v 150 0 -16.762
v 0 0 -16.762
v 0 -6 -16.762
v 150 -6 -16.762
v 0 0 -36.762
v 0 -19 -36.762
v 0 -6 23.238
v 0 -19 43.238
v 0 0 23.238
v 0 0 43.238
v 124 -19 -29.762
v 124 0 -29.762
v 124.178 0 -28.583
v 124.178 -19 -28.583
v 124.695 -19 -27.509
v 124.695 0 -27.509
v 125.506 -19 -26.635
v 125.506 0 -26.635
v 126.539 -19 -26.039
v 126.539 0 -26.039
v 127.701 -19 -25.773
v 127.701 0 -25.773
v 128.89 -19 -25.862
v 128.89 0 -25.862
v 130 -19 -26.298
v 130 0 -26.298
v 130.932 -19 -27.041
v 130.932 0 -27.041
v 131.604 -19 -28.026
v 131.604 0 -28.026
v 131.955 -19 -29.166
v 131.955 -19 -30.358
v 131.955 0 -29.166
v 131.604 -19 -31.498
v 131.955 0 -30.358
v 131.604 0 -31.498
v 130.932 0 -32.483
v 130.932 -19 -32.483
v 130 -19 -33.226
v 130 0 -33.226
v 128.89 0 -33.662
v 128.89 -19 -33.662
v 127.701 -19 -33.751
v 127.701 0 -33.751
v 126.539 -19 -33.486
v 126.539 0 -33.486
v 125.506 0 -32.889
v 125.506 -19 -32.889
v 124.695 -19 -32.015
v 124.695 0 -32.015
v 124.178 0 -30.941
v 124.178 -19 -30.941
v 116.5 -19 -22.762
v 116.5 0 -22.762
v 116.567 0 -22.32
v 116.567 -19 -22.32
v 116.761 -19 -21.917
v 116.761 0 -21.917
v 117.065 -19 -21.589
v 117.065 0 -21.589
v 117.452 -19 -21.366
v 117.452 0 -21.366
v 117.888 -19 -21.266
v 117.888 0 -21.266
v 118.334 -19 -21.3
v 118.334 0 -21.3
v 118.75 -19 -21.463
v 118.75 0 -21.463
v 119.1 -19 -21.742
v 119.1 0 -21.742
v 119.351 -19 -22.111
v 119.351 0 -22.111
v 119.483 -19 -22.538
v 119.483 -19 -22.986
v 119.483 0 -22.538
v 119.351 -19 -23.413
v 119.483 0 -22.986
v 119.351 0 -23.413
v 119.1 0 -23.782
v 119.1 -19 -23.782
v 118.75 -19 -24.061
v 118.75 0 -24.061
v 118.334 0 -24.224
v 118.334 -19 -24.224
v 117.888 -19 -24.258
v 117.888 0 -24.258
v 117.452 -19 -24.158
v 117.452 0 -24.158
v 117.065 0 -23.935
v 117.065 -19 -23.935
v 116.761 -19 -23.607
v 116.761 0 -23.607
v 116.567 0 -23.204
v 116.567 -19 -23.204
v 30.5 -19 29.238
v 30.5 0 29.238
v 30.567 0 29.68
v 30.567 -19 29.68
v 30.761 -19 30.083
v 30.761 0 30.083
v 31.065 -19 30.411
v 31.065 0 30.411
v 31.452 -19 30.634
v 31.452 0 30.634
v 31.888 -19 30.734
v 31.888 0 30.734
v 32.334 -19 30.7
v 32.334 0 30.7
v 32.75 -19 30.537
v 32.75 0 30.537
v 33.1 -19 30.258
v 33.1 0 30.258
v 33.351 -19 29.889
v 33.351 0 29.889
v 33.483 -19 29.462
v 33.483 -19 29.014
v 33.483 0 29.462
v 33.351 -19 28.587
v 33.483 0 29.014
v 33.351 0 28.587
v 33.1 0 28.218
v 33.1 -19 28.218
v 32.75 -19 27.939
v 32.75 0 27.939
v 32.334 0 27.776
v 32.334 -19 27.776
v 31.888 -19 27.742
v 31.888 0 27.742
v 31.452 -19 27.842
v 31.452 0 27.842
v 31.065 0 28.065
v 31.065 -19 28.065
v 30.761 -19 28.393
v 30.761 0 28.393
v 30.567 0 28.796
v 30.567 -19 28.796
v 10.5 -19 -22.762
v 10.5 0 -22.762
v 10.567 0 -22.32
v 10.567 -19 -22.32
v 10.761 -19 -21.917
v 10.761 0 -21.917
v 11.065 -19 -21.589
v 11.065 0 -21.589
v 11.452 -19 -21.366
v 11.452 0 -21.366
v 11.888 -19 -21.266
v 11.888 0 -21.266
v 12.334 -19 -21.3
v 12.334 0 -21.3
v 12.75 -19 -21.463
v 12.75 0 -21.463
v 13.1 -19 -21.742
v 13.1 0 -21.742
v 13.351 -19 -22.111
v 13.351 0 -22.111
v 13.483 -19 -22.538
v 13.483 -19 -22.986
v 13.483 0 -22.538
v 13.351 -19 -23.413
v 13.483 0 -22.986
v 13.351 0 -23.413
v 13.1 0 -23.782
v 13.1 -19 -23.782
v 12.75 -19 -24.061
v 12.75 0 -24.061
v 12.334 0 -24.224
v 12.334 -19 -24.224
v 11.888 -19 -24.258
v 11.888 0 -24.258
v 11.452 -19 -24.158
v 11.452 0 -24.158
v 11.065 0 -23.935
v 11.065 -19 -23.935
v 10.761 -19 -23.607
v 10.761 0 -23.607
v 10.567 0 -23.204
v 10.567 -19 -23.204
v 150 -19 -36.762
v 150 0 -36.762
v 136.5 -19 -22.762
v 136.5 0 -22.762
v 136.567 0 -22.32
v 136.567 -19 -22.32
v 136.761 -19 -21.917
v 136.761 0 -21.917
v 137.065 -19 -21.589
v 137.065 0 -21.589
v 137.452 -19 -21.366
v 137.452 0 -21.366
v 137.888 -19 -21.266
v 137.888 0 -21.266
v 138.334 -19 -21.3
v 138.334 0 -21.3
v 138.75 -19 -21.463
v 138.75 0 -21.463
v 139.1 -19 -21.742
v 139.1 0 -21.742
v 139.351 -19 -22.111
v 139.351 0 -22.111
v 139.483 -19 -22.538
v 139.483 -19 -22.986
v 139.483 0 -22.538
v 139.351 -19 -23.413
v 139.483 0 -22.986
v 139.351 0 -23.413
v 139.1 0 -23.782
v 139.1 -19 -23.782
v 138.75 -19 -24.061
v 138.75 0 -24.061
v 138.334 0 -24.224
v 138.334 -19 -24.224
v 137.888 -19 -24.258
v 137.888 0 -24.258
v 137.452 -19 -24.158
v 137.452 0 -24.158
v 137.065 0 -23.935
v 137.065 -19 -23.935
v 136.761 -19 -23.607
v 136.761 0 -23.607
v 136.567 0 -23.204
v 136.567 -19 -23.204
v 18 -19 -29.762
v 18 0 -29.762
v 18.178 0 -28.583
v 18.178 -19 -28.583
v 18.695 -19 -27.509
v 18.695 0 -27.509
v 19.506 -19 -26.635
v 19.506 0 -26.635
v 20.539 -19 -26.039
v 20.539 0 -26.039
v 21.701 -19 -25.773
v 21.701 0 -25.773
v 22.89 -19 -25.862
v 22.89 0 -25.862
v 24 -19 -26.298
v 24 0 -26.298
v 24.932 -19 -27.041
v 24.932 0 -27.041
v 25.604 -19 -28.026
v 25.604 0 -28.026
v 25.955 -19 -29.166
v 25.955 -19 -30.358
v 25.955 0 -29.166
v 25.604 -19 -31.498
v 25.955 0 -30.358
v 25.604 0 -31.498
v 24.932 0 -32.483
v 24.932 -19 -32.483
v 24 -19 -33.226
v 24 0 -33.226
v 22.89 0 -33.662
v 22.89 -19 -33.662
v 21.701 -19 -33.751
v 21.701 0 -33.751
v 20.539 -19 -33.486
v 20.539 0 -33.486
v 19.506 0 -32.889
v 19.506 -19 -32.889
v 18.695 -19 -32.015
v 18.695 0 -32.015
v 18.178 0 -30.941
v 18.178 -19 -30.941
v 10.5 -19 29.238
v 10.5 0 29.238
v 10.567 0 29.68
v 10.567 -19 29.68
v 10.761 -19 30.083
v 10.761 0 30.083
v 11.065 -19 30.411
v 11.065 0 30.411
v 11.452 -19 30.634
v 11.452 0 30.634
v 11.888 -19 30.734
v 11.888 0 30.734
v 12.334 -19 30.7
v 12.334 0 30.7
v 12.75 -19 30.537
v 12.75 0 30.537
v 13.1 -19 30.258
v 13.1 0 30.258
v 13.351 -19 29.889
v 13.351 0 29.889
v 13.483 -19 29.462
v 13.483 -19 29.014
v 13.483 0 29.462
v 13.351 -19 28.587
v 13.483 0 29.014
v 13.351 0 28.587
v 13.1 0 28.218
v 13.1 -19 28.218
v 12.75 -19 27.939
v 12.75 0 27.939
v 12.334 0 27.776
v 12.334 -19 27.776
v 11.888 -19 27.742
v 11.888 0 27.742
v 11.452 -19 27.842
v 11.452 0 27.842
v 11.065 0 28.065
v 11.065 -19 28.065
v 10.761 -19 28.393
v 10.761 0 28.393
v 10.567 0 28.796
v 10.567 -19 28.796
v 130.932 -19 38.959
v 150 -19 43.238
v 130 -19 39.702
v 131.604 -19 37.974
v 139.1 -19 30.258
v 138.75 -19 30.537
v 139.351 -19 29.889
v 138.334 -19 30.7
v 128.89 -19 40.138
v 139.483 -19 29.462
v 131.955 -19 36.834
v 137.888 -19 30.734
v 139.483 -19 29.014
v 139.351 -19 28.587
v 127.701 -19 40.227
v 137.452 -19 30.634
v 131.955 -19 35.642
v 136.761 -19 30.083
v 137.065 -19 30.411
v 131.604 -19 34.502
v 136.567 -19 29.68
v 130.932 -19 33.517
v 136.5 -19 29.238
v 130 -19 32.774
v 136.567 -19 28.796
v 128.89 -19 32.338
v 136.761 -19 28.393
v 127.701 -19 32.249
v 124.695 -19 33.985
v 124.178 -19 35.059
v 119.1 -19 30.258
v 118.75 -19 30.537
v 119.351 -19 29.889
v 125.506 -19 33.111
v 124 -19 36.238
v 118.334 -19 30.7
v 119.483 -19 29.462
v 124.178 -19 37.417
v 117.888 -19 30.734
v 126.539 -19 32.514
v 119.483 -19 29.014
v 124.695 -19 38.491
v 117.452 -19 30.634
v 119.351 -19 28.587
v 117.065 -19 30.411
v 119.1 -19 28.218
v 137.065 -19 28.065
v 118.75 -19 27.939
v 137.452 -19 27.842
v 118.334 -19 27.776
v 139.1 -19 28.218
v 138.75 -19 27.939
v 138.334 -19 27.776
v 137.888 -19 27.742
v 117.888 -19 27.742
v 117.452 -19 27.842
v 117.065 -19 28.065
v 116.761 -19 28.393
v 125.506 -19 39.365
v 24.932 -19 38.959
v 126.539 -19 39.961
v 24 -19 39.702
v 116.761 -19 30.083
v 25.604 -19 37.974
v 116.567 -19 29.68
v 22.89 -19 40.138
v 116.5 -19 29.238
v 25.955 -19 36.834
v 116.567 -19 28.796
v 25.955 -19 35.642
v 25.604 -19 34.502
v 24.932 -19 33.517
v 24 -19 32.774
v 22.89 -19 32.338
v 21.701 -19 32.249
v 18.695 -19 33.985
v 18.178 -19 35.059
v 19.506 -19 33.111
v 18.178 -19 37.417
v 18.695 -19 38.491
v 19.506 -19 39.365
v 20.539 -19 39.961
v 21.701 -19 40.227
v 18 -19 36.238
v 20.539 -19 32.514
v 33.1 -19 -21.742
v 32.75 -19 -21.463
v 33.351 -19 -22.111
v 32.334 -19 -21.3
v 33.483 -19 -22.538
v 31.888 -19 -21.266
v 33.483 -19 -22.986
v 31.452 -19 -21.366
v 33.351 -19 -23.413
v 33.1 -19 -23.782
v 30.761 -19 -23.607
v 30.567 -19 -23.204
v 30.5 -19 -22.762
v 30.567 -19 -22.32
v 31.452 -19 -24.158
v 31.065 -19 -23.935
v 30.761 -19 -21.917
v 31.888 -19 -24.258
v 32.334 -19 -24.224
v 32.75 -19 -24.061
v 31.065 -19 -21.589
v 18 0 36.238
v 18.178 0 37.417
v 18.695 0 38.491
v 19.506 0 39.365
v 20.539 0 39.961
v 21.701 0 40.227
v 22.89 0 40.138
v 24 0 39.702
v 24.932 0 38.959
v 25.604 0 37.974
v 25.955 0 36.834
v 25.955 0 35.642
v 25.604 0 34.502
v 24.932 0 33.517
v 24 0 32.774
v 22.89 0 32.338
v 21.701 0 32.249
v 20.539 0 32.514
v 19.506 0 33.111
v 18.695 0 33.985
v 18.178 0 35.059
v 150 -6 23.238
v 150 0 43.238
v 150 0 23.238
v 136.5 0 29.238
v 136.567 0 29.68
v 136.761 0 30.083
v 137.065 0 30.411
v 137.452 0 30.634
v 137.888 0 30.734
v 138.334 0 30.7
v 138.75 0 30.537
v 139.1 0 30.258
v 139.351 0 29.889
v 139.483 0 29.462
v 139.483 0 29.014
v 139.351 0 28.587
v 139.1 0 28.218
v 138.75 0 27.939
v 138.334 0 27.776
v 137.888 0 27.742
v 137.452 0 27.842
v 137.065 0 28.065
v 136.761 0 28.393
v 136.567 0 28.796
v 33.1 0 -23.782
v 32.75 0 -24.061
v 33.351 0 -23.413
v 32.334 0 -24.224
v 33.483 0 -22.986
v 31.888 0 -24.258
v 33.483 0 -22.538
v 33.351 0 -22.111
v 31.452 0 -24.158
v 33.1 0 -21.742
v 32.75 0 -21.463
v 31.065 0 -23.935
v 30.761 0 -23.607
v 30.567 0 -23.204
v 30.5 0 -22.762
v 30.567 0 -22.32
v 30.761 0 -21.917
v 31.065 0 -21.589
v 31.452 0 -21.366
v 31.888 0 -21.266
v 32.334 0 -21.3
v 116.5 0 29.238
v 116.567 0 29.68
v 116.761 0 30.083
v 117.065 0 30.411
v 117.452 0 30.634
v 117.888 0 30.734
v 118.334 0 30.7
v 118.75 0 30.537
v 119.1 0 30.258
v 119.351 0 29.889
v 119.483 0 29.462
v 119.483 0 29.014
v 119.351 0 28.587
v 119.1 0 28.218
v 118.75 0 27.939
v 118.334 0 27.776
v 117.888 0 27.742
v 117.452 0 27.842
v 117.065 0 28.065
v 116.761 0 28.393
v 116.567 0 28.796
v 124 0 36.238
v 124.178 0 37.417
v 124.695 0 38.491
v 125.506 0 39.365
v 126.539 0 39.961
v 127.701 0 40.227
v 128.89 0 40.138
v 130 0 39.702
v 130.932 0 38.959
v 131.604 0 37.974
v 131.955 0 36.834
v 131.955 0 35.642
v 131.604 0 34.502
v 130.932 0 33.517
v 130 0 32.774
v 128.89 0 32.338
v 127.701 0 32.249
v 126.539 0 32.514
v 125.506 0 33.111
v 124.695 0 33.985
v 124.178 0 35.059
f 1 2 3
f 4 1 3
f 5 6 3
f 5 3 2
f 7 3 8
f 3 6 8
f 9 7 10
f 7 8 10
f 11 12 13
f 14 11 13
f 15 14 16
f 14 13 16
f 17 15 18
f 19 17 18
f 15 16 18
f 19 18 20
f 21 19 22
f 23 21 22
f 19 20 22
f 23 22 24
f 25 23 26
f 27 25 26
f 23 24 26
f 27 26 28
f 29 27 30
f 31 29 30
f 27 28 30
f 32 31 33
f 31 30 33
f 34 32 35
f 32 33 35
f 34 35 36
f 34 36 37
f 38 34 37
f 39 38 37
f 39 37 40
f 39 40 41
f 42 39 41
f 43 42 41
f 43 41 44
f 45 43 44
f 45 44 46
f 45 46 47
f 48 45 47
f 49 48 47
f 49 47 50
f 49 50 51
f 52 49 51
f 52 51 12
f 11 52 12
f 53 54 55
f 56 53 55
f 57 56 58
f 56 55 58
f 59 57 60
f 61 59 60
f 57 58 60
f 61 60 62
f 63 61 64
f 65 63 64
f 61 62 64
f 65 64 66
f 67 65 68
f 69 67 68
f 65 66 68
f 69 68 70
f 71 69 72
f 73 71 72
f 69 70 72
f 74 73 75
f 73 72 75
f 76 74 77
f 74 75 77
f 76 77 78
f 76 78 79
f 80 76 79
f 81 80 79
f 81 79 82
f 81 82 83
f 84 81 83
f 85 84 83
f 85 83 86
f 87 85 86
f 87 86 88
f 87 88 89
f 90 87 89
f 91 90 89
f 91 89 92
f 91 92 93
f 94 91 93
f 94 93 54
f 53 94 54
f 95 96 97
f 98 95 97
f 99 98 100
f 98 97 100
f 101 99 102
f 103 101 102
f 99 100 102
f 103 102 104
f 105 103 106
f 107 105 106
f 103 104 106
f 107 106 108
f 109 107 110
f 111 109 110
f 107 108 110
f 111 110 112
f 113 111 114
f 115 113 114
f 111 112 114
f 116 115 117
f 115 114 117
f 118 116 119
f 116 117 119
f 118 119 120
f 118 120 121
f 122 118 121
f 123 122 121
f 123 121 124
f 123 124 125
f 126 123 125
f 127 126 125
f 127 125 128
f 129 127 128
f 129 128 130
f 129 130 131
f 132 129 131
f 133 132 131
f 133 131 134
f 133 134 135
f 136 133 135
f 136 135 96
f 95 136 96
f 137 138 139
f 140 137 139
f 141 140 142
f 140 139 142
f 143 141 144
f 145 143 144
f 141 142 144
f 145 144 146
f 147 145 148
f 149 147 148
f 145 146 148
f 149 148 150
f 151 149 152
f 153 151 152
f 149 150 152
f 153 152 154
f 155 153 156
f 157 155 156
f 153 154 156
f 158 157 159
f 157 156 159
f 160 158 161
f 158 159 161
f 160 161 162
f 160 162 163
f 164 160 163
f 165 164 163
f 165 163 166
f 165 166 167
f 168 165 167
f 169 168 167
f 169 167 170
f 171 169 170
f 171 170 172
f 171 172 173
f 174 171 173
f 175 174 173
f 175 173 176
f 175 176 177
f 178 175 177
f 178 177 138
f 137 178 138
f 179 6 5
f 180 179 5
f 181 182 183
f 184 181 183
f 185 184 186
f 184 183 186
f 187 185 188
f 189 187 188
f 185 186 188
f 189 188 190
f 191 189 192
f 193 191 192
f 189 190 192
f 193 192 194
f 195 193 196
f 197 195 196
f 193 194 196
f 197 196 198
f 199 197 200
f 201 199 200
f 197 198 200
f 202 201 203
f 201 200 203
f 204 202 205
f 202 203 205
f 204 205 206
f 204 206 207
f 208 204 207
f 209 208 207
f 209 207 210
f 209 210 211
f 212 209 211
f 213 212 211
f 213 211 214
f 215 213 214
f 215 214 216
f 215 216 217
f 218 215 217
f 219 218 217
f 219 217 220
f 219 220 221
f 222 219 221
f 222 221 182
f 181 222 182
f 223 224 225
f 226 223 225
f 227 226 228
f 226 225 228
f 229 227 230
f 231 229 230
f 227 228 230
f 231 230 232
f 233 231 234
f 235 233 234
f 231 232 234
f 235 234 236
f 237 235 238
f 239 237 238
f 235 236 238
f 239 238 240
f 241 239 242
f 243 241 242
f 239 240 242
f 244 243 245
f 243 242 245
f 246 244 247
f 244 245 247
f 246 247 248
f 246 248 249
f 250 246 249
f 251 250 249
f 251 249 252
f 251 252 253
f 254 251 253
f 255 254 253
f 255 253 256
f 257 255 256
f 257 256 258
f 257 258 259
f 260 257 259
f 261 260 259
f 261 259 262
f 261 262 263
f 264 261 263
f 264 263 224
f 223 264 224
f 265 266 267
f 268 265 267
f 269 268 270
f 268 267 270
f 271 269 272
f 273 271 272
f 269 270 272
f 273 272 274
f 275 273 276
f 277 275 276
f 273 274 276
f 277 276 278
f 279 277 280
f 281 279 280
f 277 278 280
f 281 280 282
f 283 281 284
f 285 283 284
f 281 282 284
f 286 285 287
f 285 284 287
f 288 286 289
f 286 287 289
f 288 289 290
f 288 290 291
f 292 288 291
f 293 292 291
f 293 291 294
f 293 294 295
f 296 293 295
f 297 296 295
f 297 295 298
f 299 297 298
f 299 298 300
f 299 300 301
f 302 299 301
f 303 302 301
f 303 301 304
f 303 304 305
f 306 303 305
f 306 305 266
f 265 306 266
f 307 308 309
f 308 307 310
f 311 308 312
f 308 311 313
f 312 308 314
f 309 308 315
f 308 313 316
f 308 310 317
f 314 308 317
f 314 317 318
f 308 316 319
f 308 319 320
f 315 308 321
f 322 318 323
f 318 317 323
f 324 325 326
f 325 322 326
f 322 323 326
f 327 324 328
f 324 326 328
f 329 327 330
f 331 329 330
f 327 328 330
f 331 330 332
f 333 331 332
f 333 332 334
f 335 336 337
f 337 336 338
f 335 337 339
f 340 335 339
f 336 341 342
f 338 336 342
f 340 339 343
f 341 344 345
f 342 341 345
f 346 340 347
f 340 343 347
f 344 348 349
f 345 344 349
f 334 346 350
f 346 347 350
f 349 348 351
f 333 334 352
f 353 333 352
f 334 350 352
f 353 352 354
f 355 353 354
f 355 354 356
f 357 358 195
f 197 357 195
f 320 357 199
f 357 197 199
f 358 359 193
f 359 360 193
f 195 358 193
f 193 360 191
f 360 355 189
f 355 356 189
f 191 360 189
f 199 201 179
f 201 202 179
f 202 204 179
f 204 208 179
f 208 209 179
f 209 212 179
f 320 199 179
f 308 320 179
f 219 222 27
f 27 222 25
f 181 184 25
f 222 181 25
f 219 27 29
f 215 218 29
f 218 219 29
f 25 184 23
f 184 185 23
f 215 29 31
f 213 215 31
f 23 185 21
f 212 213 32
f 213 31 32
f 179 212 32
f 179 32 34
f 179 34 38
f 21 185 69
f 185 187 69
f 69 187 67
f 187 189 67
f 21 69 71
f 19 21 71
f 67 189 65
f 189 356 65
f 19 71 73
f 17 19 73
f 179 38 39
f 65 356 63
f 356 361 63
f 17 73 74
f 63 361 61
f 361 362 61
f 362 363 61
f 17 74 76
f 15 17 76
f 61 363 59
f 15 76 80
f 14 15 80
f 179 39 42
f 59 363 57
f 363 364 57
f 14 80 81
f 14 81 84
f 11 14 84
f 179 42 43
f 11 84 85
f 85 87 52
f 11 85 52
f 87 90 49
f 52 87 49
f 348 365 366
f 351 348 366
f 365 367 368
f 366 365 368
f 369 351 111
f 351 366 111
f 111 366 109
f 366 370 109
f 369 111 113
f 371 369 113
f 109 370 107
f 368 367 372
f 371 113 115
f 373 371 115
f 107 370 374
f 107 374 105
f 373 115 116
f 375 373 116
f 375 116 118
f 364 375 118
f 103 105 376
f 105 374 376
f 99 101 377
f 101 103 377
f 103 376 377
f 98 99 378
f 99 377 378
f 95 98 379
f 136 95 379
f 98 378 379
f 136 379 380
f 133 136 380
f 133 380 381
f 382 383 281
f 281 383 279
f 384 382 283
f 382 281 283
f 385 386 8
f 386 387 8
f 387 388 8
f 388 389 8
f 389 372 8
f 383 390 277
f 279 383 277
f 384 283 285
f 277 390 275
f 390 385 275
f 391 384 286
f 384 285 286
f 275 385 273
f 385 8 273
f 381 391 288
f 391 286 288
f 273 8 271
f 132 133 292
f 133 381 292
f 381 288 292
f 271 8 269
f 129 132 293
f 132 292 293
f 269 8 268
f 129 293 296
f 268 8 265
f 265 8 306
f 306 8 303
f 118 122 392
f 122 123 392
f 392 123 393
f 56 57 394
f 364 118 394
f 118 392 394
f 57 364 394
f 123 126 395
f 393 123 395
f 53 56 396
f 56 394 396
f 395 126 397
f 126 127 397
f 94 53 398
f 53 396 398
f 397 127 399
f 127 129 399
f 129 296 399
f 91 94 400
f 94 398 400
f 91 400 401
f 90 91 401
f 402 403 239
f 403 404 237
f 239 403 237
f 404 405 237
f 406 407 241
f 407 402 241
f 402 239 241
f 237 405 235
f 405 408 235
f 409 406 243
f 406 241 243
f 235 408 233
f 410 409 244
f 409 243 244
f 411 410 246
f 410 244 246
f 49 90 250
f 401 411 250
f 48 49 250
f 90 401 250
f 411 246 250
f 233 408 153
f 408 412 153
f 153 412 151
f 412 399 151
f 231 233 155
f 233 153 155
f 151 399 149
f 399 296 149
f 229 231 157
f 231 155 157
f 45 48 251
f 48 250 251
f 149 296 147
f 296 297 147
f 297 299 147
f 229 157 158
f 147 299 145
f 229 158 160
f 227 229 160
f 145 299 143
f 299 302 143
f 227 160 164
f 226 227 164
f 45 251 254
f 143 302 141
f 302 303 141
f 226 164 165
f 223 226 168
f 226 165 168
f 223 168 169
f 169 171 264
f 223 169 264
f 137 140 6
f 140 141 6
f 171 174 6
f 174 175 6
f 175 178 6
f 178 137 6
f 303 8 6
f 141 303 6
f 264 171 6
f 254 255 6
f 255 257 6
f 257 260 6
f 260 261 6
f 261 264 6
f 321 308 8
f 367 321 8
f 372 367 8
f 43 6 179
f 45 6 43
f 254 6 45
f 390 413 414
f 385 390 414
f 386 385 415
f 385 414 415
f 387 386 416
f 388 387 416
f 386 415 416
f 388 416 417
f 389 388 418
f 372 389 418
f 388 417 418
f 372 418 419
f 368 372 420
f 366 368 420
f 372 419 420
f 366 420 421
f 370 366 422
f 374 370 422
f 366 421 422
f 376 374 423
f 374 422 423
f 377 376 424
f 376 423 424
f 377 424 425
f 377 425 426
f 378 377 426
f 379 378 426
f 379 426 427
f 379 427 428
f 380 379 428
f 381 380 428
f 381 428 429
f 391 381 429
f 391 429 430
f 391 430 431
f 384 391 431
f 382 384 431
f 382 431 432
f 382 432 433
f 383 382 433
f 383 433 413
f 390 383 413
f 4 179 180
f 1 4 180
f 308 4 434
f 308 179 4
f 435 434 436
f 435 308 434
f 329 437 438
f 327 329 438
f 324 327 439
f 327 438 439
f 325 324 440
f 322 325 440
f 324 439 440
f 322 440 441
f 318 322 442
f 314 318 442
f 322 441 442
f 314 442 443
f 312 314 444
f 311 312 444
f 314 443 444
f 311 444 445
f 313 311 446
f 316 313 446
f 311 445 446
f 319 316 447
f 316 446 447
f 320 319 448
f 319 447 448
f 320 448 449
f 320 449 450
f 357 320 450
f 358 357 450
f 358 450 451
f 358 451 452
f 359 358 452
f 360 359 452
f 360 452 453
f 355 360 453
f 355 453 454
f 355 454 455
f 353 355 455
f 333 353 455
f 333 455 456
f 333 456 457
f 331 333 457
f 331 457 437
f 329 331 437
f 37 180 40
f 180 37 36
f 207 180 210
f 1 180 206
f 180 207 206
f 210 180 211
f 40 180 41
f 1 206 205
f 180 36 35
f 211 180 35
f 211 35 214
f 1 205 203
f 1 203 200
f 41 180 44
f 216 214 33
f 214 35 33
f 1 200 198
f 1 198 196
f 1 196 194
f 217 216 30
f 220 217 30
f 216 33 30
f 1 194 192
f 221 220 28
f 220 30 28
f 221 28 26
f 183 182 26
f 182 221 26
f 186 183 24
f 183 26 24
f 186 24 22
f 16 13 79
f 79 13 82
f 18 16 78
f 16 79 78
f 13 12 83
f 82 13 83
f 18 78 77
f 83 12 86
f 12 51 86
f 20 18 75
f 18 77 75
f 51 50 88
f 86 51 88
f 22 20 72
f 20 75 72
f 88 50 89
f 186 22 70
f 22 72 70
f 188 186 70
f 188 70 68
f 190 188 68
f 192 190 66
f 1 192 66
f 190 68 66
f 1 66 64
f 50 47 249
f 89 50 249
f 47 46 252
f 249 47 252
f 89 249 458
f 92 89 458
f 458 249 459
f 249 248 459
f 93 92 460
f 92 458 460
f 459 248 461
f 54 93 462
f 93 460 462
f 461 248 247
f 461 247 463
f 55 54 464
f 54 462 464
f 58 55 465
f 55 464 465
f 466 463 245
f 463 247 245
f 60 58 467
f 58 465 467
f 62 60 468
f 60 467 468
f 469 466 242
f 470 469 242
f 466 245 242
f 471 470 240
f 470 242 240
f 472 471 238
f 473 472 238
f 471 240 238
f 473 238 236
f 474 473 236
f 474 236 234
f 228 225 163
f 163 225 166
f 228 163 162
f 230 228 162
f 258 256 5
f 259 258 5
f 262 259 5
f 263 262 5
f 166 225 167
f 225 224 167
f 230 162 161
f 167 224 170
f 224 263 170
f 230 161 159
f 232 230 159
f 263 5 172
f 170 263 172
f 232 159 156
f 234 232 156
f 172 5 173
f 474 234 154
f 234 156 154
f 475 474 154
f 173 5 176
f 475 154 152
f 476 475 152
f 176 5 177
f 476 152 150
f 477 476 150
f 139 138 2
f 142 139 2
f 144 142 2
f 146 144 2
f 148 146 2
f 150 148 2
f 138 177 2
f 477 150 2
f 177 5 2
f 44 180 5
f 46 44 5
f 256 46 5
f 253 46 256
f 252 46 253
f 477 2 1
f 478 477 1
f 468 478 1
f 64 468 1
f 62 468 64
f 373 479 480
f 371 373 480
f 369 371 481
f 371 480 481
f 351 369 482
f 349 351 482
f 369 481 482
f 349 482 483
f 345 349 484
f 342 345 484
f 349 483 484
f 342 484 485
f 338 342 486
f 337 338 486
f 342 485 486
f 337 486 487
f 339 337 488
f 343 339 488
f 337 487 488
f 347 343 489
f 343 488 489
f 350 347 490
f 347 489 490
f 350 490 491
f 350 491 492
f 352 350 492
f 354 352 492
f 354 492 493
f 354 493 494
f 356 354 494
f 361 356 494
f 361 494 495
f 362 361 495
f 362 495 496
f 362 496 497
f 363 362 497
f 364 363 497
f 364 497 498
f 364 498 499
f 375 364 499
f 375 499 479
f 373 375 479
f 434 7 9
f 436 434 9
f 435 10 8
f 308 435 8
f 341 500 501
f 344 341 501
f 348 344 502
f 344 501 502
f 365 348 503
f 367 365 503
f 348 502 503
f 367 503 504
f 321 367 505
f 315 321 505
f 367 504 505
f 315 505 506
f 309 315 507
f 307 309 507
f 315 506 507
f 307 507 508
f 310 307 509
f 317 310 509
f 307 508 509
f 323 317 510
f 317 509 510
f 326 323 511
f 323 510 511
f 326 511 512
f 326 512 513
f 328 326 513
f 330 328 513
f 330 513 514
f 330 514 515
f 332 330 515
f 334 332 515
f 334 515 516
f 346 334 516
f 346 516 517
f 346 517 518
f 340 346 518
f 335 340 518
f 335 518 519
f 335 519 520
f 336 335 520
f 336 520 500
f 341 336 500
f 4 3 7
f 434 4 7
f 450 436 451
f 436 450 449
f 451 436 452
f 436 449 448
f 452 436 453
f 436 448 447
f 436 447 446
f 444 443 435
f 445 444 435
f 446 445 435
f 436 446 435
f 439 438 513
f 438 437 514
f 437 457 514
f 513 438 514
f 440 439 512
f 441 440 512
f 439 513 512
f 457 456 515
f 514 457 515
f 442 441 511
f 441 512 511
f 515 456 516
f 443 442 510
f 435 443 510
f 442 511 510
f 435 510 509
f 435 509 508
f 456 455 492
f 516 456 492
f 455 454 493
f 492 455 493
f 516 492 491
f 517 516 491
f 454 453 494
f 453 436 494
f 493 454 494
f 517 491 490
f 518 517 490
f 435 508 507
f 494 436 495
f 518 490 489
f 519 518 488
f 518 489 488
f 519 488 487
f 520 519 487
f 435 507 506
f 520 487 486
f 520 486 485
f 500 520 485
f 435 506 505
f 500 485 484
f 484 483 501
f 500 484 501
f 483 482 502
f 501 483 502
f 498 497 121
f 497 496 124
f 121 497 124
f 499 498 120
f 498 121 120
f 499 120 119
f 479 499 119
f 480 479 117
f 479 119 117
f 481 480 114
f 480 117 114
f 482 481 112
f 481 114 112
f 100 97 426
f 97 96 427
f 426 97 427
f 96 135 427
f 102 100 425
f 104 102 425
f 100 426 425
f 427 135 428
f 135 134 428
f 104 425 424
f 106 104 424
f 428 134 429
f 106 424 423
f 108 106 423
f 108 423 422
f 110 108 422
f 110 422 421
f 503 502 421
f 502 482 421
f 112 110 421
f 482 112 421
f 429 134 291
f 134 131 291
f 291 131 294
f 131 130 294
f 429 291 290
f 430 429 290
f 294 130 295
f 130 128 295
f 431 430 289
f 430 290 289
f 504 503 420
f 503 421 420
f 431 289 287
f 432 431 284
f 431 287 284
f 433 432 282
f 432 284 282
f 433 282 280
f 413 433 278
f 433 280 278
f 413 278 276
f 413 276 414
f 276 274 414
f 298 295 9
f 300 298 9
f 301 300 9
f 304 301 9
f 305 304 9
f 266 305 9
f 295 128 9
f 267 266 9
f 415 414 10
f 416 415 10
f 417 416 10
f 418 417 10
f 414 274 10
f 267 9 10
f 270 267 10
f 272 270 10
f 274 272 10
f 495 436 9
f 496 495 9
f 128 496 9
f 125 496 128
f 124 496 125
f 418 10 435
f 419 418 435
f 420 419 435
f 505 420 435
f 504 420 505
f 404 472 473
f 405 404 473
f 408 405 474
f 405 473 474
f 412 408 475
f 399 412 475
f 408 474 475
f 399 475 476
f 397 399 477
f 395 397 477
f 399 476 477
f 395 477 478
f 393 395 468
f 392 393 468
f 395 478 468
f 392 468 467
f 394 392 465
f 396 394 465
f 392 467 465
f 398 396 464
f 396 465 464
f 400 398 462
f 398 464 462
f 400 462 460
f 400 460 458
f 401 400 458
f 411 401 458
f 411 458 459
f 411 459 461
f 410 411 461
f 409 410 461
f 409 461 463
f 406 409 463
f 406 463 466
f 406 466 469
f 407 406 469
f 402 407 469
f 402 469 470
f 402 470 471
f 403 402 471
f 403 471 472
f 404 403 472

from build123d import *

# Parameters (mm, degrees)
F1_DEPTH = 150
F3_D     = 3
F4_D     = 8


with BuildPart() as f1:
    # F0 (on Right) → F1 (new body)
    with BuildSketch(Plane.YZ):
        Polygon((0, 23.237994), (0, 43.237994), (-19, 43.237994), (-19, -36.762006), (0, -36.762006), (0, -16.762006), (-6, -16.762006), (-6, 23.237994), align=None)
    extrude(amount=F1_DEPTH)

    # F3 (through all)
    with Locations(Plane.XZ.offset(19)):
        with Locations((12, 29.237994), (138, 29.237994), (12, -22.762006), (138, -22.762006), (118, 29.237994), (118, -22.762006), (32, 29.237994), (32, -22.762006)):
            Hole(F3_D / 2)

    # F4 (through all)
    with Locations(Plane.XZ.offset(19)):
        with Locations((128, 36.237994), (22, 36.237994), (22, -29.762006), (128, -29.762006)):
            Hole(F4_D / 2)


solid = f1.part
